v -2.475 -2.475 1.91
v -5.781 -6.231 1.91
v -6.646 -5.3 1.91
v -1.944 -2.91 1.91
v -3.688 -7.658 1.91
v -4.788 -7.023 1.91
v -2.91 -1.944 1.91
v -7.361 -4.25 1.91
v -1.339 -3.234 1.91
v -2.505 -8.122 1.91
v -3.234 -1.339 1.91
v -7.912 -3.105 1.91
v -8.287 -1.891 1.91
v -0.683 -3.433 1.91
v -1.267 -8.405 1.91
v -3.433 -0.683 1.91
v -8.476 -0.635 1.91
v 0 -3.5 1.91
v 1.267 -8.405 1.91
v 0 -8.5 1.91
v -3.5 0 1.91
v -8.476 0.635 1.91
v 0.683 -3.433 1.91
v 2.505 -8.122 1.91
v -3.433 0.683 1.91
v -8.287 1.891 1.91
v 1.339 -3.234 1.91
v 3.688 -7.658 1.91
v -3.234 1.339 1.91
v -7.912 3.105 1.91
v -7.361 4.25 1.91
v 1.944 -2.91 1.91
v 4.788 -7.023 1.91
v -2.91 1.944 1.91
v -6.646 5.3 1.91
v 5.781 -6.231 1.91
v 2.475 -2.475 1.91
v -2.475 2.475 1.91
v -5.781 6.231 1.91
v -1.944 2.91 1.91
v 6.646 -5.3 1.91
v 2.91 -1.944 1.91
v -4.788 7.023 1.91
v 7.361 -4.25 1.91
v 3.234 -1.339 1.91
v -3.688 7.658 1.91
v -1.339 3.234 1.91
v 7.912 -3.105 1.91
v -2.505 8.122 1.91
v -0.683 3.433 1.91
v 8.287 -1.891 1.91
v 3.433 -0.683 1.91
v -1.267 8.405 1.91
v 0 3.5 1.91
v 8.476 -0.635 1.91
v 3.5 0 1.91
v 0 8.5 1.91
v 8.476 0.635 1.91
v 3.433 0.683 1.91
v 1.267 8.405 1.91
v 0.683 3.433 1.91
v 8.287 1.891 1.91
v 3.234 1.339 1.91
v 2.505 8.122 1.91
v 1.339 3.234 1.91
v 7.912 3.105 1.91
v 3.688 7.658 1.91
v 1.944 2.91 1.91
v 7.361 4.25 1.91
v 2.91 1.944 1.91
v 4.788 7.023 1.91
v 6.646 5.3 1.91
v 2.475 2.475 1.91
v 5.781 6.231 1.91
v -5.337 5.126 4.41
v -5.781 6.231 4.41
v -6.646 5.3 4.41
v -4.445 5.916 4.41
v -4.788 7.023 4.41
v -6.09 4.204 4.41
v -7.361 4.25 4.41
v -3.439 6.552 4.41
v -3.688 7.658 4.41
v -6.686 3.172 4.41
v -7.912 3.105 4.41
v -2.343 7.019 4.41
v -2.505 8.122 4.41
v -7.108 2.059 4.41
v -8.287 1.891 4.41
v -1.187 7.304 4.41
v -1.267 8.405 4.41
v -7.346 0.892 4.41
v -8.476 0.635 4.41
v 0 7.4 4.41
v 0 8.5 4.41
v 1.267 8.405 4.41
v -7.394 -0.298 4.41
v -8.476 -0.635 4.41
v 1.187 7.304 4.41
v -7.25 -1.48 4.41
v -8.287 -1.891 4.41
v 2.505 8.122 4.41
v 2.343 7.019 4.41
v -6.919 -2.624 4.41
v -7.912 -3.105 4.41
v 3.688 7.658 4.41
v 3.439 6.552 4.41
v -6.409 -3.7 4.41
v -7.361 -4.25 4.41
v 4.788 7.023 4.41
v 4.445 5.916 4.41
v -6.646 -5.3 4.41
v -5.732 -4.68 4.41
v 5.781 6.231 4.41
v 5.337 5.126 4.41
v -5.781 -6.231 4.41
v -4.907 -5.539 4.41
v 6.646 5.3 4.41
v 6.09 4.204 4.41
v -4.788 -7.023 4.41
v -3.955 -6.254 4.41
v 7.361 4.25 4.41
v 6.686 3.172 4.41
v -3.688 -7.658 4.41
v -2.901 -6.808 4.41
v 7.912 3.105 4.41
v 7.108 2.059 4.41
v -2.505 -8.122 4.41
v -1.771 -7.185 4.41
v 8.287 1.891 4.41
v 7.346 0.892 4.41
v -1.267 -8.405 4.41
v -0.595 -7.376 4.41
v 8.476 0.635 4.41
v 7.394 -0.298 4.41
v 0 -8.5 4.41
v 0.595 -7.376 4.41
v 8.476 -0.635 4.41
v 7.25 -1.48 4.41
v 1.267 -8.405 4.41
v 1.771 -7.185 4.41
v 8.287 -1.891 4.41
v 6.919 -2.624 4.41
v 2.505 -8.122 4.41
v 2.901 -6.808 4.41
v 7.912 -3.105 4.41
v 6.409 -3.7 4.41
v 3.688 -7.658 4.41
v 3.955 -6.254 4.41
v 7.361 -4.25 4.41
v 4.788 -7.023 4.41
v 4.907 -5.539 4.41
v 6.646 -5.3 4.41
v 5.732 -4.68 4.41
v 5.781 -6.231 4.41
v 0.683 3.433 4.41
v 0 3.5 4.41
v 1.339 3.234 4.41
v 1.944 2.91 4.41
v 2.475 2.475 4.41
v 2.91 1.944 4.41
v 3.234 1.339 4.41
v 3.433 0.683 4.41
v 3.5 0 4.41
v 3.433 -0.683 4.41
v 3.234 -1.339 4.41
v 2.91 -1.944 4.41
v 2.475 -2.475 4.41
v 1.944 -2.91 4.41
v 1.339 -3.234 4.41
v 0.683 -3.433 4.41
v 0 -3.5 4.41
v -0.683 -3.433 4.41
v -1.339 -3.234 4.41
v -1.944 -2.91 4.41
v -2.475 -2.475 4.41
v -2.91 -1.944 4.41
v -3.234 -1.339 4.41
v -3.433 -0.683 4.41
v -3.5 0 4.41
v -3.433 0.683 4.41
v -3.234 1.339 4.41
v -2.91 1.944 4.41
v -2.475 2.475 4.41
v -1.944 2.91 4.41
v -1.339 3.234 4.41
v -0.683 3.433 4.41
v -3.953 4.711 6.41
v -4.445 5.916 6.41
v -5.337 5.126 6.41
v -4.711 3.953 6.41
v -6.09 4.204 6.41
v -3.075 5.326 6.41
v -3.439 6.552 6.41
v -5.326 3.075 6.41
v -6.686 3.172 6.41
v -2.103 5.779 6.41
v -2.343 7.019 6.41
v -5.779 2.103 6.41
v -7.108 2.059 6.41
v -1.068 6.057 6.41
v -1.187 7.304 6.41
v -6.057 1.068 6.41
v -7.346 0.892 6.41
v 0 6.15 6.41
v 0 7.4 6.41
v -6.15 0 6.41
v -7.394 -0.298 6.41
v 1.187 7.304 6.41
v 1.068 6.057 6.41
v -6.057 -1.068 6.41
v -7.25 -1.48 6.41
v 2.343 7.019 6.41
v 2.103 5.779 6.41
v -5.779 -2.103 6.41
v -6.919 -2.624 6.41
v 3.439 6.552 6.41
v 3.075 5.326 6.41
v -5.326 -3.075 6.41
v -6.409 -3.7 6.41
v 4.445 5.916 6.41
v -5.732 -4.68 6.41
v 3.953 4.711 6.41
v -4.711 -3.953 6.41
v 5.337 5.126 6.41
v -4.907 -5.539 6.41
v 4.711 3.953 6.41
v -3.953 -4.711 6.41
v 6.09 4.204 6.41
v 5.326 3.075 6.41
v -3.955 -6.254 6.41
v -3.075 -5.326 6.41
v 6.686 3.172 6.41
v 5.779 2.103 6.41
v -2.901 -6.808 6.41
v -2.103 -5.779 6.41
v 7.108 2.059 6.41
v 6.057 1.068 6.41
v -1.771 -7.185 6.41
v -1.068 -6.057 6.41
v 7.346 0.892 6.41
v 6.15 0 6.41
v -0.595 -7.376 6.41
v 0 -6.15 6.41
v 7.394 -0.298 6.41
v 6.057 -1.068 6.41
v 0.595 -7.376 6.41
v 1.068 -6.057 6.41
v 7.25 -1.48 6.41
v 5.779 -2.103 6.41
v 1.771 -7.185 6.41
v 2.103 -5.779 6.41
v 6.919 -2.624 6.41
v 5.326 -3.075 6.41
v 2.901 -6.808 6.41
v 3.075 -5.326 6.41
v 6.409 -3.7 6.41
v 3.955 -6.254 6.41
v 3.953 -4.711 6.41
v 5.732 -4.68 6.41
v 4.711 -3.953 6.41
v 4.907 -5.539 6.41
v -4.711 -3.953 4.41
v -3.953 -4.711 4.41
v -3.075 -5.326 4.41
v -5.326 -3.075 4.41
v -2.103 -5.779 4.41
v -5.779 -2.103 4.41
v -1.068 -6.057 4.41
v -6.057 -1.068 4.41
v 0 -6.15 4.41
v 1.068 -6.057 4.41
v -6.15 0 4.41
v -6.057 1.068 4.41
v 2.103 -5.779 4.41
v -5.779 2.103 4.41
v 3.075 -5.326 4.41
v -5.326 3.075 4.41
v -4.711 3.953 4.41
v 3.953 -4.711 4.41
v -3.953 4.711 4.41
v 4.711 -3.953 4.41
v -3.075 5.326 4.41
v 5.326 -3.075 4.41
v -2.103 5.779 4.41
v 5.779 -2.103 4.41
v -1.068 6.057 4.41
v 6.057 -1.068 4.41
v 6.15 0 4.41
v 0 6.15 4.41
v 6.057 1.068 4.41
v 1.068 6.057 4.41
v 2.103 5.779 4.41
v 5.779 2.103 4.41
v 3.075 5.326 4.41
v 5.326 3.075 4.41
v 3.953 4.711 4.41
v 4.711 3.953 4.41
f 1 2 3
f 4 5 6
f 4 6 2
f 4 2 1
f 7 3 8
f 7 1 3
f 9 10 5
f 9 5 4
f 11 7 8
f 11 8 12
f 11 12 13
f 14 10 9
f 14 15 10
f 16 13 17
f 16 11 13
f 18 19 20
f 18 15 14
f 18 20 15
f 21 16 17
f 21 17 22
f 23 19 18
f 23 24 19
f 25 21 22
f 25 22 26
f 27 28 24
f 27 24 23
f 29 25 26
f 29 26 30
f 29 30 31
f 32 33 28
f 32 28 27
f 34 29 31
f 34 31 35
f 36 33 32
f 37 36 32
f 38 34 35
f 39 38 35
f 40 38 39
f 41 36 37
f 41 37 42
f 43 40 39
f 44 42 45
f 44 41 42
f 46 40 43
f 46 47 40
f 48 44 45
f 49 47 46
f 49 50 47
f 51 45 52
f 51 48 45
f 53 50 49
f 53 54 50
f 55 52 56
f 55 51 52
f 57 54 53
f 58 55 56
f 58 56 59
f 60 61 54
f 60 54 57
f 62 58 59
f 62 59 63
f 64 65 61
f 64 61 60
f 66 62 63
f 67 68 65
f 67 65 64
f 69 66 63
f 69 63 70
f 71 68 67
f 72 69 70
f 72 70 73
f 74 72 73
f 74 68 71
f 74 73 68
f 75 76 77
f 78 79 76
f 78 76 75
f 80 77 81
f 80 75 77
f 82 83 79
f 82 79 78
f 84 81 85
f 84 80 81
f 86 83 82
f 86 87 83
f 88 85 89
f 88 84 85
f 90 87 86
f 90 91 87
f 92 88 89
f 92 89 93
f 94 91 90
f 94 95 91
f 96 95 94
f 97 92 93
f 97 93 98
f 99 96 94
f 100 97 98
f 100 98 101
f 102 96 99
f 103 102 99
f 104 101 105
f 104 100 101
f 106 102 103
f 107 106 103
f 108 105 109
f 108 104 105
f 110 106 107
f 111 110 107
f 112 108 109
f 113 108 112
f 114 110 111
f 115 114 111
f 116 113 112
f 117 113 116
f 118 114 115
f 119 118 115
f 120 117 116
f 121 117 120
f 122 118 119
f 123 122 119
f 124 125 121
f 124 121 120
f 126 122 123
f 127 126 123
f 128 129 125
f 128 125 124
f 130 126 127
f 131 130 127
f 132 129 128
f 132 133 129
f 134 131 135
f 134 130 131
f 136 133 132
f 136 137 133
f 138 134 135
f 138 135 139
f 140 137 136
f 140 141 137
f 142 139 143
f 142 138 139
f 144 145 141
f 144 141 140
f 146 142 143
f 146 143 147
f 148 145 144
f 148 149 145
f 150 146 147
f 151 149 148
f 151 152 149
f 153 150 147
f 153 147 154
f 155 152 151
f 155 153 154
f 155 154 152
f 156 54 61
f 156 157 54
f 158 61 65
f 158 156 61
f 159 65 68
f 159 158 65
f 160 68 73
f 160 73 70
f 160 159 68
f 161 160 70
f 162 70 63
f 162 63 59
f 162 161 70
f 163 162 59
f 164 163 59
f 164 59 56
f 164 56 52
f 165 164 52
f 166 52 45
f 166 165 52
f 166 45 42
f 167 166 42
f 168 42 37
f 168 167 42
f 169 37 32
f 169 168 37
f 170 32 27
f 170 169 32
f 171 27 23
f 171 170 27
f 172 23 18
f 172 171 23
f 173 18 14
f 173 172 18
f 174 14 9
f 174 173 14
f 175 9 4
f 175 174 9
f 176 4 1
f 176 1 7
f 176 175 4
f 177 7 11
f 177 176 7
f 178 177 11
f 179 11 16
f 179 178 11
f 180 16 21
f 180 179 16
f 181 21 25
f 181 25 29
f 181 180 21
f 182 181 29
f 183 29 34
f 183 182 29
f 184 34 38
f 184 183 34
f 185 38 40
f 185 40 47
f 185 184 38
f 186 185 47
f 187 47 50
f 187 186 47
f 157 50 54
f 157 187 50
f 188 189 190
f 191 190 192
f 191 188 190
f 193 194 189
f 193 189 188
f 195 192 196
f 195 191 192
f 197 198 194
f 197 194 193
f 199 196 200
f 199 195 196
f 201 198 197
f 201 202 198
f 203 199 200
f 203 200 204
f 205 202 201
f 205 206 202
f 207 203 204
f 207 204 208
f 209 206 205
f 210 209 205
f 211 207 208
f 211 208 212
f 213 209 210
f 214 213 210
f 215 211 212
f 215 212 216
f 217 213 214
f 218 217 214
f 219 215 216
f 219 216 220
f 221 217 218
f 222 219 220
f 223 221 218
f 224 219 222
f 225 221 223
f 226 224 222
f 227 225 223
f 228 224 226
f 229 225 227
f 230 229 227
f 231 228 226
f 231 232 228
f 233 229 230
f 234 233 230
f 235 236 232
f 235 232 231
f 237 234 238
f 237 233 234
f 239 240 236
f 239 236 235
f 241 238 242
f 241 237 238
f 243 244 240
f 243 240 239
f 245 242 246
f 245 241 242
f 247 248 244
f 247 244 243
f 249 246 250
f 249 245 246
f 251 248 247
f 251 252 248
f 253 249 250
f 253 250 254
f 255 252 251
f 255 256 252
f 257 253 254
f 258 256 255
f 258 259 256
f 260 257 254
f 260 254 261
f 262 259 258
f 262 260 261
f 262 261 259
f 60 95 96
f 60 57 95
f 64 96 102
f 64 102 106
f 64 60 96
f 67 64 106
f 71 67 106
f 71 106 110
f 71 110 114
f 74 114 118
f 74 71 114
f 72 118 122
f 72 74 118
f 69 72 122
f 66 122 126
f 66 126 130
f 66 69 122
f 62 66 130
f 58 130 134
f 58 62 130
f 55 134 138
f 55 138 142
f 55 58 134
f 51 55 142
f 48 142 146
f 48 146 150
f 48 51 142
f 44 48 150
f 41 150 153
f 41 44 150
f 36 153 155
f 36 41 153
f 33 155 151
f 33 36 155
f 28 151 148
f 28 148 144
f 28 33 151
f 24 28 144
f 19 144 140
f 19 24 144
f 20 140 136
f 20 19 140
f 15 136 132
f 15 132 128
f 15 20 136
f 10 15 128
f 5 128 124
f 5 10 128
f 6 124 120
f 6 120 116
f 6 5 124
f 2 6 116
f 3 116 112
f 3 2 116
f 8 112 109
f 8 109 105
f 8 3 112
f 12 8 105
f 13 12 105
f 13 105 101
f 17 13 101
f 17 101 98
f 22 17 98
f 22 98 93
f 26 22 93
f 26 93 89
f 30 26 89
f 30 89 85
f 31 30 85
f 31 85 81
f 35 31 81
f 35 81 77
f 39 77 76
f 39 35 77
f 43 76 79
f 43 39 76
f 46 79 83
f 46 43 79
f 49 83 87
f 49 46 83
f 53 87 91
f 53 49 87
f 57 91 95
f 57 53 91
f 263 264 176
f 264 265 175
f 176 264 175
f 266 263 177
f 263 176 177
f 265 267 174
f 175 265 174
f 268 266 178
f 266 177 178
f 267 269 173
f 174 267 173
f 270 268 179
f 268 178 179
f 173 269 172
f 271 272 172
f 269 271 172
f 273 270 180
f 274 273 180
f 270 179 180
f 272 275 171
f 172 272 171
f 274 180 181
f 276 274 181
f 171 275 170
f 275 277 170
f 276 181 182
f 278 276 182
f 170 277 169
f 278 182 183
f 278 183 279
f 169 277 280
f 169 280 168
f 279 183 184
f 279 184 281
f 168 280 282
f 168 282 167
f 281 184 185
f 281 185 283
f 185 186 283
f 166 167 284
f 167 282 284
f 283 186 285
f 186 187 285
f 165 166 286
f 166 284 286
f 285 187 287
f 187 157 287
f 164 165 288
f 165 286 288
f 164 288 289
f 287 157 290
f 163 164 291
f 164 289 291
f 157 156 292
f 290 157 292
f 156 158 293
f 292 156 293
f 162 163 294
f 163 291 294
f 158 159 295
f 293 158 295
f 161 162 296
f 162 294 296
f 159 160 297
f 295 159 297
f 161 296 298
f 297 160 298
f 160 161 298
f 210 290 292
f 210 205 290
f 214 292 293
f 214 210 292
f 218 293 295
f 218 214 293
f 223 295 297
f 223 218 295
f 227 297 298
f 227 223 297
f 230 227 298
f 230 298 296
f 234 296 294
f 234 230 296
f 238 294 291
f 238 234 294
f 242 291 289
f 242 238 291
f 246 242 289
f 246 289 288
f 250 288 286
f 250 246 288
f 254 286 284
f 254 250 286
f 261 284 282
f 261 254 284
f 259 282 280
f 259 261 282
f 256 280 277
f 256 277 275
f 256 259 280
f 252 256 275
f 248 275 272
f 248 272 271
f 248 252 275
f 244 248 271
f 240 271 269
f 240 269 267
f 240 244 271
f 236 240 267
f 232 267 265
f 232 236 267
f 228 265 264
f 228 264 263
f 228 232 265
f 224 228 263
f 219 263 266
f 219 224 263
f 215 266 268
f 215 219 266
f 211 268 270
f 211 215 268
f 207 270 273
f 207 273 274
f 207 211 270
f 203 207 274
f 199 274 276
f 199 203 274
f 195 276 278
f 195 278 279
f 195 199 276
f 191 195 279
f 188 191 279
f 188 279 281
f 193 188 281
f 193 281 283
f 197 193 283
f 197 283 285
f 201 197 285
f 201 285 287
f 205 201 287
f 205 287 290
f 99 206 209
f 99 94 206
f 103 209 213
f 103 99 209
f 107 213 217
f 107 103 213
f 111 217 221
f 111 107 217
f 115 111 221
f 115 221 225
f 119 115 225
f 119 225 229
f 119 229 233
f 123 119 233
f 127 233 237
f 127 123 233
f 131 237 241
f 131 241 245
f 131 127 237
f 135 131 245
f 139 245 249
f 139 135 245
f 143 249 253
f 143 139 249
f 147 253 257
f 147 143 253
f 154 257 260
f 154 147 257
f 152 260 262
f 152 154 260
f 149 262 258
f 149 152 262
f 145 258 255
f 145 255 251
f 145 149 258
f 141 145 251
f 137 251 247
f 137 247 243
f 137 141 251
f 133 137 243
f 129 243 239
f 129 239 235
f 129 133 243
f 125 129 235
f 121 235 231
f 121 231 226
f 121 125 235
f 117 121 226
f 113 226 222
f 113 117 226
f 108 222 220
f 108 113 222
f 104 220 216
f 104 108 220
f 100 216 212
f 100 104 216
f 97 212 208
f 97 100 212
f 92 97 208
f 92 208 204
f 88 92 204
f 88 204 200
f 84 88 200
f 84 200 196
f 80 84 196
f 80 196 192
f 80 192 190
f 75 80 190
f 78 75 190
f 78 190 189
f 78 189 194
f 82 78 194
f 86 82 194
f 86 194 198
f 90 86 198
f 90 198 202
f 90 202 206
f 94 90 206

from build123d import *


with BuildPart() as part:
    # Sketch1 → Revolve1 (revolve)
    with BuildSketch(Plane(origin=(0, 0, 0), x_dir=(0, 0, -1), z_dir=(1, 0, 0))):
        Polygon((-4.409523218, 7.4), (-4.409523218, 8.5), (-1.909523218, 8.5), (-1.909523218, 3.5), (-4.409523218, 3.5), (-4.409523218, 4.25), (-4.409523218, 6.15), (-6.409523218, 6.15), (-6.409523218, 7.4), align=None)
    revolve(axis=Axis((0, 0, 52.974875508), (0, 0, -1)))


solid = part.part
